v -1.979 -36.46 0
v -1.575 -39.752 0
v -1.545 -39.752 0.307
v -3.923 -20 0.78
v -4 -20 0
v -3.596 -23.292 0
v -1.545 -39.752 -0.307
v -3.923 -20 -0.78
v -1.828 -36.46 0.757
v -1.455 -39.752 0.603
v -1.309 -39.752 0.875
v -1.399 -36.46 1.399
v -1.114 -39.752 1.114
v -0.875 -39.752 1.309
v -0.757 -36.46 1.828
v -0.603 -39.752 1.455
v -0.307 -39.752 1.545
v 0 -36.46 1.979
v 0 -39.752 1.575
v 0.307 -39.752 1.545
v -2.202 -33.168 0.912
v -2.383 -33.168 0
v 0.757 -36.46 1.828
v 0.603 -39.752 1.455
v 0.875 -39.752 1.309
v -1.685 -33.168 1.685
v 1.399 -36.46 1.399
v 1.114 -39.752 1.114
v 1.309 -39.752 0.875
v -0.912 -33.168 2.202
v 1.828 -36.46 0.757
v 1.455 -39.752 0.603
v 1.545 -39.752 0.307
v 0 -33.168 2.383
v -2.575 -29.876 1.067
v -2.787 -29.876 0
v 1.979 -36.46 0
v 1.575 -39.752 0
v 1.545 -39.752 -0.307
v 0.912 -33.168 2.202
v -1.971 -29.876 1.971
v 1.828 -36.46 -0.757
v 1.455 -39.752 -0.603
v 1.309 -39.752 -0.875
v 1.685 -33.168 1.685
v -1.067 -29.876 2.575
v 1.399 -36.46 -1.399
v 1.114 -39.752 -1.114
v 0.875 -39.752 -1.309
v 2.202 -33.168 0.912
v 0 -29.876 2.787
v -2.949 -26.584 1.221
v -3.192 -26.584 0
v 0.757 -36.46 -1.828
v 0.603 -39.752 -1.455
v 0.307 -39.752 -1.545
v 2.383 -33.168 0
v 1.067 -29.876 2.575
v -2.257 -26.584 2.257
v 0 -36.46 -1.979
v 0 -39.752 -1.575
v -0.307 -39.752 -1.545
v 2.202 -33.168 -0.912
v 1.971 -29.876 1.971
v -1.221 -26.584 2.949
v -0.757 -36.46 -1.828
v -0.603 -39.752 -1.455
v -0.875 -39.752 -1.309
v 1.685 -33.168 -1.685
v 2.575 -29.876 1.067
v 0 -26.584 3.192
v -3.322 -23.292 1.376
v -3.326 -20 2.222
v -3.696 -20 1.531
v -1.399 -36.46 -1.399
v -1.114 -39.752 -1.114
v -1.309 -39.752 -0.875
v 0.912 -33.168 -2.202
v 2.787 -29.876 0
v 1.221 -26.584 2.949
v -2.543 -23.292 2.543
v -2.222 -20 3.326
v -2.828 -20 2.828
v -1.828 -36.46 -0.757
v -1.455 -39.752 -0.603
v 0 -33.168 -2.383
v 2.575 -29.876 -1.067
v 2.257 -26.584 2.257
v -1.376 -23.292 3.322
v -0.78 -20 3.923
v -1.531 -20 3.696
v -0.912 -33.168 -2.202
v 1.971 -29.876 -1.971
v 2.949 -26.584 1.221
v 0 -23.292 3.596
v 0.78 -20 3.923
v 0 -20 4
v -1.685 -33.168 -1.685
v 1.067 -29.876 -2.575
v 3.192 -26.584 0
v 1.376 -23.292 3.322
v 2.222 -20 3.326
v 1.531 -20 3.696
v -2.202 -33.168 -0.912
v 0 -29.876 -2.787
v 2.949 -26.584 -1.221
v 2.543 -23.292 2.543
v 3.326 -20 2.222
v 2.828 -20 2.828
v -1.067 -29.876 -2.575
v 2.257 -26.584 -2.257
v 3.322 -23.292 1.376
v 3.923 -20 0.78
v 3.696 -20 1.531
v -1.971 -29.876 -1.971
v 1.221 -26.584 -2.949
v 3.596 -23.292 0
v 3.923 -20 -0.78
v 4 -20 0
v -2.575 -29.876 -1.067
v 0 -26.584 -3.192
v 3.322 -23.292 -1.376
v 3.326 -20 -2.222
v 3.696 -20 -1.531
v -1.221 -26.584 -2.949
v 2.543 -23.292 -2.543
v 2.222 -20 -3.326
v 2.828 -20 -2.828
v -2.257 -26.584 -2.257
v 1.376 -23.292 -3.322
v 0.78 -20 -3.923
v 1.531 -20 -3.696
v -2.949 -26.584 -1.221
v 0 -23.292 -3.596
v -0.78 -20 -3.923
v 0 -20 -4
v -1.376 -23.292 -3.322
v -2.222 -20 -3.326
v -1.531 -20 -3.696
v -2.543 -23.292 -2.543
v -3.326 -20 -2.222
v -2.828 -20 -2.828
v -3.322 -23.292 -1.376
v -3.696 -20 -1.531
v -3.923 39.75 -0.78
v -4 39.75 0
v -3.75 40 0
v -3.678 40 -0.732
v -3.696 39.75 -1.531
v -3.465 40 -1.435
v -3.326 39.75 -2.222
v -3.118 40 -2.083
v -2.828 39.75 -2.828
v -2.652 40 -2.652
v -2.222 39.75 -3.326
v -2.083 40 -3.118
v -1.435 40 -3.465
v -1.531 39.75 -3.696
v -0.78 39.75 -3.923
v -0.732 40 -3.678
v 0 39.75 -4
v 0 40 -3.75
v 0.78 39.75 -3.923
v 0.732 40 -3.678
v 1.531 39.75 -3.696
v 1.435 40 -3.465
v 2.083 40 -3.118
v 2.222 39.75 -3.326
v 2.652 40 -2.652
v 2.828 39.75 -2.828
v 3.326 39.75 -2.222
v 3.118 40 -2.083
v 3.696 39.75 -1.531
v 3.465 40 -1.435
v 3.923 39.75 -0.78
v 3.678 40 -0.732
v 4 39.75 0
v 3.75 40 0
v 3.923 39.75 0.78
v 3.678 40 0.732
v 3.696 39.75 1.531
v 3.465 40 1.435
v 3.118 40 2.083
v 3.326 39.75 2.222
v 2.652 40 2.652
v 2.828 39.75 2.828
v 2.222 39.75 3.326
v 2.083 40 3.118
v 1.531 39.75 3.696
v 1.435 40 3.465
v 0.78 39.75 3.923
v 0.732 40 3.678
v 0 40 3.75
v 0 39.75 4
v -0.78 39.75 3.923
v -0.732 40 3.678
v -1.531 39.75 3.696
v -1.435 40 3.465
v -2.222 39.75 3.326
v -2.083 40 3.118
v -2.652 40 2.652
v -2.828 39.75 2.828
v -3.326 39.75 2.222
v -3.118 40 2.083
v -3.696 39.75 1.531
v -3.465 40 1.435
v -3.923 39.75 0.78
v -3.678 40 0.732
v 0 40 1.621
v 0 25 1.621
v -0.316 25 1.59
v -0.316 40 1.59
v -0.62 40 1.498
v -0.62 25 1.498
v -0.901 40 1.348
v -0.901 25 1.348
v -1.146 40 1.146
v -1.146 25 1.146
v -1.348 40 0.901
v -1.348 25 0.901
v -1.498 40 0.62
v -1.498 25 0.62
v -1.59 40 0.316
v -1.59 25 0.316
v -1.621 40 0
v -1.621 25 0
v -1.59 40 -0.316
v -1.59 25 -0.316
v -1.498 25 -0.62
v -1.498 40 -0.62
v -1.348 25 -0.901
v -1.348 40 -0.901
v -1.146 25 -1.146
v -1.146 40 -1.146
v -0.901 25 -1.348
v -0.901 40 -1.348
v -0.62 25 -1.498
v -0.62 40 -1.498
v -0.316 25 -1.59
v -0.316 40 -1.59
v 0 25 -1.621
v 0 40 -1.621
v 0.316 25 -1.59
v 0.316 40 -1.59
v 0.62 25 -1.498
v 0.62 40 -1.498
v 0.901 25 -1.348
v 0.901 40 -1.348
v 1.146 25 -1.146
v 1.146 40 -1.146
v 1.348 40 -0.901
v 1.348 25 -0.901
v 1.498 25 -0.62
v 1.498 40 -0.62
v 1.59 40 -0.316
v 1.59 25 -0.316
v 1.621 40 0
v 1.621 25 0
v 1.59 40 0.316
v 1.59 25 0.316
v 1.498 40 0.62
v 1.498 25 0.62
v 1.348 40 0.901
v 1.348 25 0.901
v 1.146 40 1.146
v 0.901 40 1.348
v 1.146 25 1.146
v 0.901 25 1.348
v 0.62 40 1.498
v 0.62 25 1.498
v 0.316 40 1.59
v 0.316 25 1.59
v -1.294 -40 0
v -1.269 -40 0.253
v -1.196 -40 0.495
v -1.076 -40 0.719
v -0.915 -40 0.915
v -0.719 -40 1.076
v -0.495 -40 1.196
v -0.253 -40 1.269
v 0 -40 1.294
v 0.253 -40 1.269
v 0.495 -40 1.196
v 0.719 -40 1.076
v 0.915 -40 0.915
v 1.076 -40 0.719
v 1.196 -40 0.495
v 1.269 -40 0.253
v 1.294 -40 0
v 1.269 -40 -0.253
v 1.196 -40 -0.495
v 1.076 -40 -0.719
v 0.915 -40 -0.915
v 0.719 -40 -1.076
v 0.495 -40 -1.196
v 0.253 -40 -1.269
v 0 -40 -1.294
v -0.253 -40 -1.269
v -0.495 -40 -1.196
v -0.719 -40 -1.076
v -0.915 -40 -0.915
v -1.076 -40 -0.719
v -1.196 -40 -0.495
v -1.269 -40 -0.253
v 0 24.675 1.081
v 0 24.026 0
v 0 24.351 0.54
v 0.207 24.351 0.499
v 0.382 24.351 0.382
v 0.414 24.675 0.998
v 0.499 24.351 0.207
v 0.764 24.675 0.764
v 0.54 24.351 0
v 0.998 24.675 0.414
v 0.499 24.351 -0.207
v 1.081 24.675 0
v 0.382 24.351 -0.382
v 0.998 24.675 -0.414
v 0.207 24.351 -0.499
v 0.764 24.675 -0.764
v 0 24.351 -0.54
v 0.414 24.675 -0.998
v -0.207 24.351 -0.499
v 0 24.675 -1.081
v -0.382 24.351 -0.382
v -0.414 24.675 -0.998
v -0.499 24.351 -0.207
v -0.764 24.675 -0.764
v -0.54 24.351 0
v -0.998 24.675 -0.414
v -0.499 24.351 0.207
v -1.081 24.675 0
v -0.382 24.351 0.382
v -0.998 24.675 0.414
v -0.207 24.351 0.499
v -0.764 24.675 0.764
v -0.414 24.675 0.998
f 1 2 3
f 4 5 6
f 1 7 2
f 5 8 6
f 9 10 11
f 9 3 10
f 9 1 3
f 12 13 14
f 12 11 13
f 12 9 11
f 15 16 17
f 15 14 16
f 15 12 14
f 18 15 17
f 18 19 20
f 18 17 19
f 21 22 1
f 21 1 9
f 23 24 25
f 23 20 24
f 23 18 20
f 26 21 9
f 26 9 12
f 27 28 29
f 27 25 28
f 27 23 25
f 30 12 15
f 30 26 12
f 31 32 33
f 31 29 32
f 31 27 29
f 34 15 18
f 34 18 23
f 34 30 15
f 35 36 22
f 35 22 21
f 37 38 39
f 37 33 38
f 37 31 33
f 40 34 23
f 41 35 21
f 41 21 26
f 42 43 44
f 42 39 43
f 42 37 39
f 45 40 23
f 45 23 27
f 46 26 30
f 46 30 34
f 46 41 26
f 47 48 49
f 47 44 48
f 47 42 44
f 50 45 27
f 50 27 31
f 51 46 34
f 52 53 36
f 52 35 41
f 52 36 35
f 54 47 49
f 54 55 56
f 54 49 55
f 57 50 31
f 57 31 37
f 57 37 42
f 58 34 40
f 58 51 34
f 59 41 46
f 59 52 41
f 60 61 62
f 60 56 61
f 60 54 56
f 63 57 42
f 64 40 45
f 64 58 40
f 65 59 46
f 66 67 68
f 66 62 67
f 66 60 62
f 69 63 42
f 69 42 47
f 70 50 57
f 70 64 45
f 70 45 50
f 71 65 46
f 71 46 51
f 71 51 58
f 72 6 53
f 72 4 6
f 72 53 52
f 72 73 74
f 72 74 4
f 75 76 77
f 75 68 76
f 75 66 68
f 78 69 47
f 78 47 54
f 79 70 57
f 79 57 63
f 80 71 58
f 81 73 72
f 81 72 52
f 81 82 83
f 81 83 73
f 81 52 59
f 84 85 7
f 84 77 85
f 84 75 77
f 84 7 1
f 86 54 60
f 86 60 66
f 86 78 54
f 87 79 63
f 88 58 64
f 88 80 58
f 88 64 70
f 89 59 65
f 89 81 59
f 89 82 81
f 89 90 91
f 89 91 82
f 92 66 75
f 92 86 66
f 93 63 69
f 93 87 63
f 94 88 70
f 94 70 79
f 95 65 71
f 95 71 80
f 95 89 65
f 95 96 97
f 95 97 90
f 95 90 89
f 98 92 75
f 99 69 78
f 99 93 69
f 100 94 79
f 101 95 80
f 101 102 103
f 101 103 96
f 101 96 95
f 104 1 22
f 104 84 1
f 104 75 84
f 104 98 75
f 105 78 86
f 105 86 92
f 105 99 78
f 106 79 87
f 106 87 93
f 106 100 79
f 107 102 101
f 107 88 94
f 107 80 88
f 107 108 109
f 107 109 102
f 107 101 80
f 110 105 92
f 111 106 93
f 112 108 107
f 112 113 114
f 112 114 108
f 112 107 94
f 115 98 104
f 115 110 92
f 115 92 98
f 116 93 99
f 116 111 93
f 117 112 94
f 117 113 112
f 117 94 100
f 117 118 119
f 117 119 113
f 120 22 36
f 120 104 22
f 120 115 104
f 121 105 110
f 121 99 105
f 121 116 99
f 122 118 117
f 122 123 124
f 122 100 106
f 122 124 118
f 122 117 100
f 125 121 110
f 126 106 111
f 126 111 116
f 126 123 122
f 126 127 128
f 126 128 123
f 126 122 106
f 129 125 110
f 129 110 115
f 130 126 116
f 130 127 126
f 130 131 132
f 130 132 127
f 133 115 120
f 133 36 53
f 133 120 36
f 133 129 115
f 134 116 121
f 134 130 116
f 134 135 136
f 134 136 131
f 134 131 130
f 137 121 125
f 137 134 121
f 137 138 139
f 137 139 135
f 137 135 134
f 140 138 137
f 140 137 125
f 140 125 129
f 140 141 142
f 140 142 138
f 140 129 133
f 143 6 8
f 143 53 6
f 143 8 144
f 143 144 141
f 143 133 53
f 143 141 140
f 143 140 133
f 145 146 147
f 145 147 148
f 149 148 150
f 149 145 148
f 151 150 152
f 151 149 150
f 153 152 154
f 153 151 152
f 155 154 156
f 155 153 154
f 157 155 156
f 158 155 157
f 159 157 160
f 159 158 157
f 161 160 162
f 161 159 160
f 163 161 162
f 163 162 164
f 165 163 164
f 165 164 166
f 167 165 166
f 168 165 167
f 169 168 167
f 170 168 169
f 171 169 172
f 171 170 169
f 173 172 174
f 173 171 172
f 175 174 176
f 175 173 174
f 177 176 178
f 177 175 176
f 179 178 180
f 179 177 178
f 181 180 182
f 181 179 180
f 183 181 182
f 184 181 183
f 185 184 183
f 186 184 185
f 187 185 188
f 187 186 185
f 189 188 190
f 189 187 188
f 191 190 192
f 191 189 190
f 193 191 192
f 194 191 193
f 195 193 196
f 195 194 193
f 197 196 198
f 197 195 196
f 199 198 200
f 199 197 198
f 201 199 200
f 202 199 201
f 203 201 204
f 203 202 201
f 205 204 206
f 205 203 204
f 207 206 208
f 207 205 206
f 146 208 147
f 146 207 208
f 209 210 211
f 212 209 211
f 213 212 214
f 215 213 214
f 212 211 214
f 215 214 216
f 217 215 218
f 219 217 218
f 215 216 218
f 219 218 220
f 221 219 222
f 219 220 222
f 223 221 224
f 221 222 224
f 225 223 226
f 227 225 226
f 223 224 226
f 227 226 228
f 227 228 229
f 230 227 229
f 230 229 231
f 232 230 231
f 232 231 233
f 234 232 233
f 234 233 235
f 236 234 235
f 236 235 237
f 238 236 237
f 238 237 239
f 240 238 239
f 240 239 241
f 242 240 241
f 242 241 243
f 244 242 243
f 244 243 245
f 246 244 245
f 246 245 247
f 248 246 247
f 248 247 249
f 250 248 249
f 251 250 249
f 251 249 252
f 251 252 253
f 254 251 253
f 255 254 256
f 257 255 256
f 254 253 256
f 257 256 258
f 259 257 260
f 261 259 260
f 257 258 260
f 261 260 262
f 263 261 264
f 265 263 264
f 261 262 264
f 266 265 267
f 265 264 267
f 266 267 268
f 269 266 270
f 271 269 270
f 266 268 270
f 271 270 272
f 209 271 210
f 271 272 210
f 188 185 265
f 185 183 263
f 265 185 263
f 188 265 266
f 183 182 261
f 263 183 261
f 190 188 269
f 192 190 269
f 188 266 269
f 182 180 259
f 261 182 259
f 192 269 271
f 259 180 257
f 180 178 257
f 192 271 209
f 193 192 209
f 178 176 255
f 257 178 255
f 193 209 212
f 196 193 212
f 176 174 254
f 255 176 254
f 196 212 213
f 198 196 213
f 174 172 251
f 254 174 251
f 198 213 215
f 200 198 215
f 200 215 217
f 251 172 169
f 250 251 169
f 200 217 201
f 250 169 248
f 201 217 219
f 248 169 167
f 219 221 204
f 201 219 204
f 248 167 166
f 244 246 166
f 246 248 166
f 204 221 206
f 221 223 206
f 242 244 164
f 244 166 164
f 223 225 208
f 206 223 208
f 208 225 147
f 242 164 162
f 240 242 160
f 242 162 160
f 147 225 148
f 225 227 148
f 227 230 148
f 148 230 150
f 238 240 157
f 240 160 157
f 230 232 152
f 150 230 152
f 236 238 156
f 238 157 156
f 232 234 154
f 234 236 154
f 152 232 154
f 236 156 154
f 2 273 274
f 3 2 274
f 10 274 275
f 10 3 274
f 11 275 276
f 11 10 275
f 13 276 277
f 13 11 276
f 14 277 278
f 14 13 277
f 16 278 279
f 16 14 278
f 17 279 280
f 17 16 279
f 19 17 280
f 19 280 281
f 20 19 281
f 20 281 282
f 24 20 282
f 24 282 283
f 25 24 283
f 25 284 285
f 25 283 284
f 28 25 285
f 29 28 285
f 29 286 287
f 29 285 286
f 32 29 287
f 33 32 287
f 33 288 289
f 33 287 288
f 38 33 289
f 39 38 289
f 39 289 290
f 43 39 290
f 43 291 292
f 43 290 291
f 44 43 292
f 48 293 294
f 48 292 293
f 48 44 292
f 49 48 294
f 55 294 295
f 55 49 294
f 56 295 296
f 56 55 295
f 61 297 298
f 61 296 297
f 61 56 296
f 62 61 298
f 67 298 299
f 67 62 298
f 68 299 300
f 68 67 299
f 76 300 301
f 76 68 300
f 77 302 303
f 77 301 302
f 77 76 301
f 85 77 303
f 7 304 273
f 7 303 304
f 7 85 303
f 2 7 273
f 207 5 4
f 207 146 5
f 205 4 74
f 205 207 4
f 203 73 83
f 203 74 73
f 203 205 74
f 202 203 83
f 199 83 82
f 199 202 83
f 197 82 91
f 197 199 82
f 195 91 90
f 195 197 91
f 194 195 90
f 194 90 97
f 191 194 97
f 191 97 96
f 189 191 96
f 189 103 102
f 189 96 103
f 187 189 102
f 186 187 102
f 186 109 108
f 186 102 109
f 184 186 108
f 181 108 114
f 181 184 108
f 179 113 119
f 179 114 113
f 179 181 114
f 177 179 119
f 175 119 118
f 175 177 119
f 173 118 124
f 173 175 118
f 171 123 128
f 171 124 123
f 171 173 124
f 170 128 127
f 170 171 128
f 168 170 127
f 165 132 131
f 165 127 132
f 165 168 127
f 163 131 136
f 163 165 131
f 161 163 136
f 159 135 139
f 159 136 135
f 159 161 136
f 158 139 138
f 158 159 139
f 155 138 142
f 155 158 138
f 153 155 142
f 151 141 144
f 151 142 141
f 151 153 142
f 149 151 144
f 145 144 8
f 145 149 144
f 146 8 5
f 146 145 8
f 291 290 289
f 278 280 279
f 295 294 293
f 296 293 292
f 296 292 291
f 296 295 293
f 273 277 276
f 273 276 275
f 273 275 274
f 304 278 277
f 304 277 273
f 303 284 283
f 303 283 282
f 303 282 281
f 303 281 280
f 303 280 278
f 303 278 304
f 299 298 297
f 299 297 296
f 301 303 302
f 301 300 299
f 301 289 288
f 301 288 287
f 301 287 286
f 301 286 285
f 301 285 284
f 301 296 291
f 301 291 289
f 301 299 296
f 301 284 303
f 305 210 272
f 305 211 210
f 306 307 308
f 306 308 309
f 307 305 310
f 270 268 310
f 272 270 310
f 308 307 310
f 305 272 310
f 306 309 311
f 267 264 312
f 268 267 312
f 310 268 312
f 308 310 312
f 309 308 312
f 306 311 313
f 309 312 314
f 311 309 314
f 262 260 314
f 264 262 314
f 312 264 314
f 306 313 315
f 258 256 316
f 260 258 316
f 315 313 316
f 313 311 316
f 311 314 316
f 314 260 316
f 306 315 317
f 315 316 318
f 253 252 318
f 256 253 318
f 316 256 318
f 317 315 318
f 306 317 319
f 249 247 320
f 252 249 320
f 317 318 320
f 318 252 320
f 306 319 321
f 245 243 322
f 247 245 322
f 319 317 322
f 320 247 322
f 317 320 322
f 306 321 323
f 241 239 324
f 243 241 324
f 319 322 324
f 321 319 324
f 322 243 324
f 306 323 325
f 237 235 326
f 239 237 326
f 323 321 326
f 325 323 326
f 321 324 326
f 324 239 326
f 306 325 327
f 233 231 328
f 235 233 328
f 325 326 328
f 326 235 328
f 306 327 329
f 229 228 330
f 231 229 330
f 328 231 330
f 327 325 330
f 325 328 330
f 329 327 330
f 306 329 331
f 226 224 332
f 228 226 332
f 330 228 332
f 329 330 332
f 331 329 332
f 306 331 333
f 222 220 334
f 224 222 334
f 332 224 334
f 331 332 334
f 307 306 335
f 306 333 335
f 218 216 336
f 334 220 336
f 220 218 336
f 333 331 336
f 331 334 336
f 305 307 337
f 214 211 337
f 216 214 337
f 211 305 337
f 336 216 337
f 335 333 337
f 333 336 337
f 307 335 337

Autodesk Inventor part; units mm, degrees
ref_plane "YZ Plane" through (0, 0, 0) normal (1, 0, 0) x (0, 1, 0)
ref_plane "XZ Plane" through (0, 0, 0) normal (0, 1, 0) x (-1, 0, 0)
ref_plane "XY Plane" through (0, 0, 0) normal (0, 0, 1) x (1, 0, 0)
sketch "Sketch1" plane through (0, 0, 0) normal (0, 0, 1) x (1, 0, 0)
  line L0 (-4.8, 0) -> (0.8, 0) construction
  line L1 (0, -56) -> (0, 56) construction
  line L2 (-4, 40) -> (0, 40)
  line L3 (0, 40) -> (0, -40)
  line L4 (0, -40) -> (-4, -40)
  line L5 (-4, -40) -> (-4, 40)
  line L6 (-1.5443, -40) -> (-4, -20)
  point P0 (0, 0)
  dimension "d0" = 8
  dimension "d1" = 80
  dimension "d13" = 20
  dimension "d14" = 3.0886
  dimension "d17" = 7
revolve "Revolution1" add sketch "Sketch1" angle 360 about axis through (0, 40, 0) along (0, -1, 0) contours L2 L3 L4 L6 L5
sketch "Sketch2" plane through (0, 40, 0) normal (0, 1, 0) x (1, 0, 0)
  circle A0 centre (0, 0) radius 4
hole "Hole1" at (0, 40, 0) direction (0, -1, 0) diameter 3.242 depth 15 tip angle 118 thread size "M4x0.7" class "6H" standard "ISO Metric profile"
chamfer "Chamfer1" distance 0.25 angle 45 2 edges at (1.5443, -40, 0) (4, 40, 0)
properties part number "FCT-01-001C" material "Aço SAE 1045"
